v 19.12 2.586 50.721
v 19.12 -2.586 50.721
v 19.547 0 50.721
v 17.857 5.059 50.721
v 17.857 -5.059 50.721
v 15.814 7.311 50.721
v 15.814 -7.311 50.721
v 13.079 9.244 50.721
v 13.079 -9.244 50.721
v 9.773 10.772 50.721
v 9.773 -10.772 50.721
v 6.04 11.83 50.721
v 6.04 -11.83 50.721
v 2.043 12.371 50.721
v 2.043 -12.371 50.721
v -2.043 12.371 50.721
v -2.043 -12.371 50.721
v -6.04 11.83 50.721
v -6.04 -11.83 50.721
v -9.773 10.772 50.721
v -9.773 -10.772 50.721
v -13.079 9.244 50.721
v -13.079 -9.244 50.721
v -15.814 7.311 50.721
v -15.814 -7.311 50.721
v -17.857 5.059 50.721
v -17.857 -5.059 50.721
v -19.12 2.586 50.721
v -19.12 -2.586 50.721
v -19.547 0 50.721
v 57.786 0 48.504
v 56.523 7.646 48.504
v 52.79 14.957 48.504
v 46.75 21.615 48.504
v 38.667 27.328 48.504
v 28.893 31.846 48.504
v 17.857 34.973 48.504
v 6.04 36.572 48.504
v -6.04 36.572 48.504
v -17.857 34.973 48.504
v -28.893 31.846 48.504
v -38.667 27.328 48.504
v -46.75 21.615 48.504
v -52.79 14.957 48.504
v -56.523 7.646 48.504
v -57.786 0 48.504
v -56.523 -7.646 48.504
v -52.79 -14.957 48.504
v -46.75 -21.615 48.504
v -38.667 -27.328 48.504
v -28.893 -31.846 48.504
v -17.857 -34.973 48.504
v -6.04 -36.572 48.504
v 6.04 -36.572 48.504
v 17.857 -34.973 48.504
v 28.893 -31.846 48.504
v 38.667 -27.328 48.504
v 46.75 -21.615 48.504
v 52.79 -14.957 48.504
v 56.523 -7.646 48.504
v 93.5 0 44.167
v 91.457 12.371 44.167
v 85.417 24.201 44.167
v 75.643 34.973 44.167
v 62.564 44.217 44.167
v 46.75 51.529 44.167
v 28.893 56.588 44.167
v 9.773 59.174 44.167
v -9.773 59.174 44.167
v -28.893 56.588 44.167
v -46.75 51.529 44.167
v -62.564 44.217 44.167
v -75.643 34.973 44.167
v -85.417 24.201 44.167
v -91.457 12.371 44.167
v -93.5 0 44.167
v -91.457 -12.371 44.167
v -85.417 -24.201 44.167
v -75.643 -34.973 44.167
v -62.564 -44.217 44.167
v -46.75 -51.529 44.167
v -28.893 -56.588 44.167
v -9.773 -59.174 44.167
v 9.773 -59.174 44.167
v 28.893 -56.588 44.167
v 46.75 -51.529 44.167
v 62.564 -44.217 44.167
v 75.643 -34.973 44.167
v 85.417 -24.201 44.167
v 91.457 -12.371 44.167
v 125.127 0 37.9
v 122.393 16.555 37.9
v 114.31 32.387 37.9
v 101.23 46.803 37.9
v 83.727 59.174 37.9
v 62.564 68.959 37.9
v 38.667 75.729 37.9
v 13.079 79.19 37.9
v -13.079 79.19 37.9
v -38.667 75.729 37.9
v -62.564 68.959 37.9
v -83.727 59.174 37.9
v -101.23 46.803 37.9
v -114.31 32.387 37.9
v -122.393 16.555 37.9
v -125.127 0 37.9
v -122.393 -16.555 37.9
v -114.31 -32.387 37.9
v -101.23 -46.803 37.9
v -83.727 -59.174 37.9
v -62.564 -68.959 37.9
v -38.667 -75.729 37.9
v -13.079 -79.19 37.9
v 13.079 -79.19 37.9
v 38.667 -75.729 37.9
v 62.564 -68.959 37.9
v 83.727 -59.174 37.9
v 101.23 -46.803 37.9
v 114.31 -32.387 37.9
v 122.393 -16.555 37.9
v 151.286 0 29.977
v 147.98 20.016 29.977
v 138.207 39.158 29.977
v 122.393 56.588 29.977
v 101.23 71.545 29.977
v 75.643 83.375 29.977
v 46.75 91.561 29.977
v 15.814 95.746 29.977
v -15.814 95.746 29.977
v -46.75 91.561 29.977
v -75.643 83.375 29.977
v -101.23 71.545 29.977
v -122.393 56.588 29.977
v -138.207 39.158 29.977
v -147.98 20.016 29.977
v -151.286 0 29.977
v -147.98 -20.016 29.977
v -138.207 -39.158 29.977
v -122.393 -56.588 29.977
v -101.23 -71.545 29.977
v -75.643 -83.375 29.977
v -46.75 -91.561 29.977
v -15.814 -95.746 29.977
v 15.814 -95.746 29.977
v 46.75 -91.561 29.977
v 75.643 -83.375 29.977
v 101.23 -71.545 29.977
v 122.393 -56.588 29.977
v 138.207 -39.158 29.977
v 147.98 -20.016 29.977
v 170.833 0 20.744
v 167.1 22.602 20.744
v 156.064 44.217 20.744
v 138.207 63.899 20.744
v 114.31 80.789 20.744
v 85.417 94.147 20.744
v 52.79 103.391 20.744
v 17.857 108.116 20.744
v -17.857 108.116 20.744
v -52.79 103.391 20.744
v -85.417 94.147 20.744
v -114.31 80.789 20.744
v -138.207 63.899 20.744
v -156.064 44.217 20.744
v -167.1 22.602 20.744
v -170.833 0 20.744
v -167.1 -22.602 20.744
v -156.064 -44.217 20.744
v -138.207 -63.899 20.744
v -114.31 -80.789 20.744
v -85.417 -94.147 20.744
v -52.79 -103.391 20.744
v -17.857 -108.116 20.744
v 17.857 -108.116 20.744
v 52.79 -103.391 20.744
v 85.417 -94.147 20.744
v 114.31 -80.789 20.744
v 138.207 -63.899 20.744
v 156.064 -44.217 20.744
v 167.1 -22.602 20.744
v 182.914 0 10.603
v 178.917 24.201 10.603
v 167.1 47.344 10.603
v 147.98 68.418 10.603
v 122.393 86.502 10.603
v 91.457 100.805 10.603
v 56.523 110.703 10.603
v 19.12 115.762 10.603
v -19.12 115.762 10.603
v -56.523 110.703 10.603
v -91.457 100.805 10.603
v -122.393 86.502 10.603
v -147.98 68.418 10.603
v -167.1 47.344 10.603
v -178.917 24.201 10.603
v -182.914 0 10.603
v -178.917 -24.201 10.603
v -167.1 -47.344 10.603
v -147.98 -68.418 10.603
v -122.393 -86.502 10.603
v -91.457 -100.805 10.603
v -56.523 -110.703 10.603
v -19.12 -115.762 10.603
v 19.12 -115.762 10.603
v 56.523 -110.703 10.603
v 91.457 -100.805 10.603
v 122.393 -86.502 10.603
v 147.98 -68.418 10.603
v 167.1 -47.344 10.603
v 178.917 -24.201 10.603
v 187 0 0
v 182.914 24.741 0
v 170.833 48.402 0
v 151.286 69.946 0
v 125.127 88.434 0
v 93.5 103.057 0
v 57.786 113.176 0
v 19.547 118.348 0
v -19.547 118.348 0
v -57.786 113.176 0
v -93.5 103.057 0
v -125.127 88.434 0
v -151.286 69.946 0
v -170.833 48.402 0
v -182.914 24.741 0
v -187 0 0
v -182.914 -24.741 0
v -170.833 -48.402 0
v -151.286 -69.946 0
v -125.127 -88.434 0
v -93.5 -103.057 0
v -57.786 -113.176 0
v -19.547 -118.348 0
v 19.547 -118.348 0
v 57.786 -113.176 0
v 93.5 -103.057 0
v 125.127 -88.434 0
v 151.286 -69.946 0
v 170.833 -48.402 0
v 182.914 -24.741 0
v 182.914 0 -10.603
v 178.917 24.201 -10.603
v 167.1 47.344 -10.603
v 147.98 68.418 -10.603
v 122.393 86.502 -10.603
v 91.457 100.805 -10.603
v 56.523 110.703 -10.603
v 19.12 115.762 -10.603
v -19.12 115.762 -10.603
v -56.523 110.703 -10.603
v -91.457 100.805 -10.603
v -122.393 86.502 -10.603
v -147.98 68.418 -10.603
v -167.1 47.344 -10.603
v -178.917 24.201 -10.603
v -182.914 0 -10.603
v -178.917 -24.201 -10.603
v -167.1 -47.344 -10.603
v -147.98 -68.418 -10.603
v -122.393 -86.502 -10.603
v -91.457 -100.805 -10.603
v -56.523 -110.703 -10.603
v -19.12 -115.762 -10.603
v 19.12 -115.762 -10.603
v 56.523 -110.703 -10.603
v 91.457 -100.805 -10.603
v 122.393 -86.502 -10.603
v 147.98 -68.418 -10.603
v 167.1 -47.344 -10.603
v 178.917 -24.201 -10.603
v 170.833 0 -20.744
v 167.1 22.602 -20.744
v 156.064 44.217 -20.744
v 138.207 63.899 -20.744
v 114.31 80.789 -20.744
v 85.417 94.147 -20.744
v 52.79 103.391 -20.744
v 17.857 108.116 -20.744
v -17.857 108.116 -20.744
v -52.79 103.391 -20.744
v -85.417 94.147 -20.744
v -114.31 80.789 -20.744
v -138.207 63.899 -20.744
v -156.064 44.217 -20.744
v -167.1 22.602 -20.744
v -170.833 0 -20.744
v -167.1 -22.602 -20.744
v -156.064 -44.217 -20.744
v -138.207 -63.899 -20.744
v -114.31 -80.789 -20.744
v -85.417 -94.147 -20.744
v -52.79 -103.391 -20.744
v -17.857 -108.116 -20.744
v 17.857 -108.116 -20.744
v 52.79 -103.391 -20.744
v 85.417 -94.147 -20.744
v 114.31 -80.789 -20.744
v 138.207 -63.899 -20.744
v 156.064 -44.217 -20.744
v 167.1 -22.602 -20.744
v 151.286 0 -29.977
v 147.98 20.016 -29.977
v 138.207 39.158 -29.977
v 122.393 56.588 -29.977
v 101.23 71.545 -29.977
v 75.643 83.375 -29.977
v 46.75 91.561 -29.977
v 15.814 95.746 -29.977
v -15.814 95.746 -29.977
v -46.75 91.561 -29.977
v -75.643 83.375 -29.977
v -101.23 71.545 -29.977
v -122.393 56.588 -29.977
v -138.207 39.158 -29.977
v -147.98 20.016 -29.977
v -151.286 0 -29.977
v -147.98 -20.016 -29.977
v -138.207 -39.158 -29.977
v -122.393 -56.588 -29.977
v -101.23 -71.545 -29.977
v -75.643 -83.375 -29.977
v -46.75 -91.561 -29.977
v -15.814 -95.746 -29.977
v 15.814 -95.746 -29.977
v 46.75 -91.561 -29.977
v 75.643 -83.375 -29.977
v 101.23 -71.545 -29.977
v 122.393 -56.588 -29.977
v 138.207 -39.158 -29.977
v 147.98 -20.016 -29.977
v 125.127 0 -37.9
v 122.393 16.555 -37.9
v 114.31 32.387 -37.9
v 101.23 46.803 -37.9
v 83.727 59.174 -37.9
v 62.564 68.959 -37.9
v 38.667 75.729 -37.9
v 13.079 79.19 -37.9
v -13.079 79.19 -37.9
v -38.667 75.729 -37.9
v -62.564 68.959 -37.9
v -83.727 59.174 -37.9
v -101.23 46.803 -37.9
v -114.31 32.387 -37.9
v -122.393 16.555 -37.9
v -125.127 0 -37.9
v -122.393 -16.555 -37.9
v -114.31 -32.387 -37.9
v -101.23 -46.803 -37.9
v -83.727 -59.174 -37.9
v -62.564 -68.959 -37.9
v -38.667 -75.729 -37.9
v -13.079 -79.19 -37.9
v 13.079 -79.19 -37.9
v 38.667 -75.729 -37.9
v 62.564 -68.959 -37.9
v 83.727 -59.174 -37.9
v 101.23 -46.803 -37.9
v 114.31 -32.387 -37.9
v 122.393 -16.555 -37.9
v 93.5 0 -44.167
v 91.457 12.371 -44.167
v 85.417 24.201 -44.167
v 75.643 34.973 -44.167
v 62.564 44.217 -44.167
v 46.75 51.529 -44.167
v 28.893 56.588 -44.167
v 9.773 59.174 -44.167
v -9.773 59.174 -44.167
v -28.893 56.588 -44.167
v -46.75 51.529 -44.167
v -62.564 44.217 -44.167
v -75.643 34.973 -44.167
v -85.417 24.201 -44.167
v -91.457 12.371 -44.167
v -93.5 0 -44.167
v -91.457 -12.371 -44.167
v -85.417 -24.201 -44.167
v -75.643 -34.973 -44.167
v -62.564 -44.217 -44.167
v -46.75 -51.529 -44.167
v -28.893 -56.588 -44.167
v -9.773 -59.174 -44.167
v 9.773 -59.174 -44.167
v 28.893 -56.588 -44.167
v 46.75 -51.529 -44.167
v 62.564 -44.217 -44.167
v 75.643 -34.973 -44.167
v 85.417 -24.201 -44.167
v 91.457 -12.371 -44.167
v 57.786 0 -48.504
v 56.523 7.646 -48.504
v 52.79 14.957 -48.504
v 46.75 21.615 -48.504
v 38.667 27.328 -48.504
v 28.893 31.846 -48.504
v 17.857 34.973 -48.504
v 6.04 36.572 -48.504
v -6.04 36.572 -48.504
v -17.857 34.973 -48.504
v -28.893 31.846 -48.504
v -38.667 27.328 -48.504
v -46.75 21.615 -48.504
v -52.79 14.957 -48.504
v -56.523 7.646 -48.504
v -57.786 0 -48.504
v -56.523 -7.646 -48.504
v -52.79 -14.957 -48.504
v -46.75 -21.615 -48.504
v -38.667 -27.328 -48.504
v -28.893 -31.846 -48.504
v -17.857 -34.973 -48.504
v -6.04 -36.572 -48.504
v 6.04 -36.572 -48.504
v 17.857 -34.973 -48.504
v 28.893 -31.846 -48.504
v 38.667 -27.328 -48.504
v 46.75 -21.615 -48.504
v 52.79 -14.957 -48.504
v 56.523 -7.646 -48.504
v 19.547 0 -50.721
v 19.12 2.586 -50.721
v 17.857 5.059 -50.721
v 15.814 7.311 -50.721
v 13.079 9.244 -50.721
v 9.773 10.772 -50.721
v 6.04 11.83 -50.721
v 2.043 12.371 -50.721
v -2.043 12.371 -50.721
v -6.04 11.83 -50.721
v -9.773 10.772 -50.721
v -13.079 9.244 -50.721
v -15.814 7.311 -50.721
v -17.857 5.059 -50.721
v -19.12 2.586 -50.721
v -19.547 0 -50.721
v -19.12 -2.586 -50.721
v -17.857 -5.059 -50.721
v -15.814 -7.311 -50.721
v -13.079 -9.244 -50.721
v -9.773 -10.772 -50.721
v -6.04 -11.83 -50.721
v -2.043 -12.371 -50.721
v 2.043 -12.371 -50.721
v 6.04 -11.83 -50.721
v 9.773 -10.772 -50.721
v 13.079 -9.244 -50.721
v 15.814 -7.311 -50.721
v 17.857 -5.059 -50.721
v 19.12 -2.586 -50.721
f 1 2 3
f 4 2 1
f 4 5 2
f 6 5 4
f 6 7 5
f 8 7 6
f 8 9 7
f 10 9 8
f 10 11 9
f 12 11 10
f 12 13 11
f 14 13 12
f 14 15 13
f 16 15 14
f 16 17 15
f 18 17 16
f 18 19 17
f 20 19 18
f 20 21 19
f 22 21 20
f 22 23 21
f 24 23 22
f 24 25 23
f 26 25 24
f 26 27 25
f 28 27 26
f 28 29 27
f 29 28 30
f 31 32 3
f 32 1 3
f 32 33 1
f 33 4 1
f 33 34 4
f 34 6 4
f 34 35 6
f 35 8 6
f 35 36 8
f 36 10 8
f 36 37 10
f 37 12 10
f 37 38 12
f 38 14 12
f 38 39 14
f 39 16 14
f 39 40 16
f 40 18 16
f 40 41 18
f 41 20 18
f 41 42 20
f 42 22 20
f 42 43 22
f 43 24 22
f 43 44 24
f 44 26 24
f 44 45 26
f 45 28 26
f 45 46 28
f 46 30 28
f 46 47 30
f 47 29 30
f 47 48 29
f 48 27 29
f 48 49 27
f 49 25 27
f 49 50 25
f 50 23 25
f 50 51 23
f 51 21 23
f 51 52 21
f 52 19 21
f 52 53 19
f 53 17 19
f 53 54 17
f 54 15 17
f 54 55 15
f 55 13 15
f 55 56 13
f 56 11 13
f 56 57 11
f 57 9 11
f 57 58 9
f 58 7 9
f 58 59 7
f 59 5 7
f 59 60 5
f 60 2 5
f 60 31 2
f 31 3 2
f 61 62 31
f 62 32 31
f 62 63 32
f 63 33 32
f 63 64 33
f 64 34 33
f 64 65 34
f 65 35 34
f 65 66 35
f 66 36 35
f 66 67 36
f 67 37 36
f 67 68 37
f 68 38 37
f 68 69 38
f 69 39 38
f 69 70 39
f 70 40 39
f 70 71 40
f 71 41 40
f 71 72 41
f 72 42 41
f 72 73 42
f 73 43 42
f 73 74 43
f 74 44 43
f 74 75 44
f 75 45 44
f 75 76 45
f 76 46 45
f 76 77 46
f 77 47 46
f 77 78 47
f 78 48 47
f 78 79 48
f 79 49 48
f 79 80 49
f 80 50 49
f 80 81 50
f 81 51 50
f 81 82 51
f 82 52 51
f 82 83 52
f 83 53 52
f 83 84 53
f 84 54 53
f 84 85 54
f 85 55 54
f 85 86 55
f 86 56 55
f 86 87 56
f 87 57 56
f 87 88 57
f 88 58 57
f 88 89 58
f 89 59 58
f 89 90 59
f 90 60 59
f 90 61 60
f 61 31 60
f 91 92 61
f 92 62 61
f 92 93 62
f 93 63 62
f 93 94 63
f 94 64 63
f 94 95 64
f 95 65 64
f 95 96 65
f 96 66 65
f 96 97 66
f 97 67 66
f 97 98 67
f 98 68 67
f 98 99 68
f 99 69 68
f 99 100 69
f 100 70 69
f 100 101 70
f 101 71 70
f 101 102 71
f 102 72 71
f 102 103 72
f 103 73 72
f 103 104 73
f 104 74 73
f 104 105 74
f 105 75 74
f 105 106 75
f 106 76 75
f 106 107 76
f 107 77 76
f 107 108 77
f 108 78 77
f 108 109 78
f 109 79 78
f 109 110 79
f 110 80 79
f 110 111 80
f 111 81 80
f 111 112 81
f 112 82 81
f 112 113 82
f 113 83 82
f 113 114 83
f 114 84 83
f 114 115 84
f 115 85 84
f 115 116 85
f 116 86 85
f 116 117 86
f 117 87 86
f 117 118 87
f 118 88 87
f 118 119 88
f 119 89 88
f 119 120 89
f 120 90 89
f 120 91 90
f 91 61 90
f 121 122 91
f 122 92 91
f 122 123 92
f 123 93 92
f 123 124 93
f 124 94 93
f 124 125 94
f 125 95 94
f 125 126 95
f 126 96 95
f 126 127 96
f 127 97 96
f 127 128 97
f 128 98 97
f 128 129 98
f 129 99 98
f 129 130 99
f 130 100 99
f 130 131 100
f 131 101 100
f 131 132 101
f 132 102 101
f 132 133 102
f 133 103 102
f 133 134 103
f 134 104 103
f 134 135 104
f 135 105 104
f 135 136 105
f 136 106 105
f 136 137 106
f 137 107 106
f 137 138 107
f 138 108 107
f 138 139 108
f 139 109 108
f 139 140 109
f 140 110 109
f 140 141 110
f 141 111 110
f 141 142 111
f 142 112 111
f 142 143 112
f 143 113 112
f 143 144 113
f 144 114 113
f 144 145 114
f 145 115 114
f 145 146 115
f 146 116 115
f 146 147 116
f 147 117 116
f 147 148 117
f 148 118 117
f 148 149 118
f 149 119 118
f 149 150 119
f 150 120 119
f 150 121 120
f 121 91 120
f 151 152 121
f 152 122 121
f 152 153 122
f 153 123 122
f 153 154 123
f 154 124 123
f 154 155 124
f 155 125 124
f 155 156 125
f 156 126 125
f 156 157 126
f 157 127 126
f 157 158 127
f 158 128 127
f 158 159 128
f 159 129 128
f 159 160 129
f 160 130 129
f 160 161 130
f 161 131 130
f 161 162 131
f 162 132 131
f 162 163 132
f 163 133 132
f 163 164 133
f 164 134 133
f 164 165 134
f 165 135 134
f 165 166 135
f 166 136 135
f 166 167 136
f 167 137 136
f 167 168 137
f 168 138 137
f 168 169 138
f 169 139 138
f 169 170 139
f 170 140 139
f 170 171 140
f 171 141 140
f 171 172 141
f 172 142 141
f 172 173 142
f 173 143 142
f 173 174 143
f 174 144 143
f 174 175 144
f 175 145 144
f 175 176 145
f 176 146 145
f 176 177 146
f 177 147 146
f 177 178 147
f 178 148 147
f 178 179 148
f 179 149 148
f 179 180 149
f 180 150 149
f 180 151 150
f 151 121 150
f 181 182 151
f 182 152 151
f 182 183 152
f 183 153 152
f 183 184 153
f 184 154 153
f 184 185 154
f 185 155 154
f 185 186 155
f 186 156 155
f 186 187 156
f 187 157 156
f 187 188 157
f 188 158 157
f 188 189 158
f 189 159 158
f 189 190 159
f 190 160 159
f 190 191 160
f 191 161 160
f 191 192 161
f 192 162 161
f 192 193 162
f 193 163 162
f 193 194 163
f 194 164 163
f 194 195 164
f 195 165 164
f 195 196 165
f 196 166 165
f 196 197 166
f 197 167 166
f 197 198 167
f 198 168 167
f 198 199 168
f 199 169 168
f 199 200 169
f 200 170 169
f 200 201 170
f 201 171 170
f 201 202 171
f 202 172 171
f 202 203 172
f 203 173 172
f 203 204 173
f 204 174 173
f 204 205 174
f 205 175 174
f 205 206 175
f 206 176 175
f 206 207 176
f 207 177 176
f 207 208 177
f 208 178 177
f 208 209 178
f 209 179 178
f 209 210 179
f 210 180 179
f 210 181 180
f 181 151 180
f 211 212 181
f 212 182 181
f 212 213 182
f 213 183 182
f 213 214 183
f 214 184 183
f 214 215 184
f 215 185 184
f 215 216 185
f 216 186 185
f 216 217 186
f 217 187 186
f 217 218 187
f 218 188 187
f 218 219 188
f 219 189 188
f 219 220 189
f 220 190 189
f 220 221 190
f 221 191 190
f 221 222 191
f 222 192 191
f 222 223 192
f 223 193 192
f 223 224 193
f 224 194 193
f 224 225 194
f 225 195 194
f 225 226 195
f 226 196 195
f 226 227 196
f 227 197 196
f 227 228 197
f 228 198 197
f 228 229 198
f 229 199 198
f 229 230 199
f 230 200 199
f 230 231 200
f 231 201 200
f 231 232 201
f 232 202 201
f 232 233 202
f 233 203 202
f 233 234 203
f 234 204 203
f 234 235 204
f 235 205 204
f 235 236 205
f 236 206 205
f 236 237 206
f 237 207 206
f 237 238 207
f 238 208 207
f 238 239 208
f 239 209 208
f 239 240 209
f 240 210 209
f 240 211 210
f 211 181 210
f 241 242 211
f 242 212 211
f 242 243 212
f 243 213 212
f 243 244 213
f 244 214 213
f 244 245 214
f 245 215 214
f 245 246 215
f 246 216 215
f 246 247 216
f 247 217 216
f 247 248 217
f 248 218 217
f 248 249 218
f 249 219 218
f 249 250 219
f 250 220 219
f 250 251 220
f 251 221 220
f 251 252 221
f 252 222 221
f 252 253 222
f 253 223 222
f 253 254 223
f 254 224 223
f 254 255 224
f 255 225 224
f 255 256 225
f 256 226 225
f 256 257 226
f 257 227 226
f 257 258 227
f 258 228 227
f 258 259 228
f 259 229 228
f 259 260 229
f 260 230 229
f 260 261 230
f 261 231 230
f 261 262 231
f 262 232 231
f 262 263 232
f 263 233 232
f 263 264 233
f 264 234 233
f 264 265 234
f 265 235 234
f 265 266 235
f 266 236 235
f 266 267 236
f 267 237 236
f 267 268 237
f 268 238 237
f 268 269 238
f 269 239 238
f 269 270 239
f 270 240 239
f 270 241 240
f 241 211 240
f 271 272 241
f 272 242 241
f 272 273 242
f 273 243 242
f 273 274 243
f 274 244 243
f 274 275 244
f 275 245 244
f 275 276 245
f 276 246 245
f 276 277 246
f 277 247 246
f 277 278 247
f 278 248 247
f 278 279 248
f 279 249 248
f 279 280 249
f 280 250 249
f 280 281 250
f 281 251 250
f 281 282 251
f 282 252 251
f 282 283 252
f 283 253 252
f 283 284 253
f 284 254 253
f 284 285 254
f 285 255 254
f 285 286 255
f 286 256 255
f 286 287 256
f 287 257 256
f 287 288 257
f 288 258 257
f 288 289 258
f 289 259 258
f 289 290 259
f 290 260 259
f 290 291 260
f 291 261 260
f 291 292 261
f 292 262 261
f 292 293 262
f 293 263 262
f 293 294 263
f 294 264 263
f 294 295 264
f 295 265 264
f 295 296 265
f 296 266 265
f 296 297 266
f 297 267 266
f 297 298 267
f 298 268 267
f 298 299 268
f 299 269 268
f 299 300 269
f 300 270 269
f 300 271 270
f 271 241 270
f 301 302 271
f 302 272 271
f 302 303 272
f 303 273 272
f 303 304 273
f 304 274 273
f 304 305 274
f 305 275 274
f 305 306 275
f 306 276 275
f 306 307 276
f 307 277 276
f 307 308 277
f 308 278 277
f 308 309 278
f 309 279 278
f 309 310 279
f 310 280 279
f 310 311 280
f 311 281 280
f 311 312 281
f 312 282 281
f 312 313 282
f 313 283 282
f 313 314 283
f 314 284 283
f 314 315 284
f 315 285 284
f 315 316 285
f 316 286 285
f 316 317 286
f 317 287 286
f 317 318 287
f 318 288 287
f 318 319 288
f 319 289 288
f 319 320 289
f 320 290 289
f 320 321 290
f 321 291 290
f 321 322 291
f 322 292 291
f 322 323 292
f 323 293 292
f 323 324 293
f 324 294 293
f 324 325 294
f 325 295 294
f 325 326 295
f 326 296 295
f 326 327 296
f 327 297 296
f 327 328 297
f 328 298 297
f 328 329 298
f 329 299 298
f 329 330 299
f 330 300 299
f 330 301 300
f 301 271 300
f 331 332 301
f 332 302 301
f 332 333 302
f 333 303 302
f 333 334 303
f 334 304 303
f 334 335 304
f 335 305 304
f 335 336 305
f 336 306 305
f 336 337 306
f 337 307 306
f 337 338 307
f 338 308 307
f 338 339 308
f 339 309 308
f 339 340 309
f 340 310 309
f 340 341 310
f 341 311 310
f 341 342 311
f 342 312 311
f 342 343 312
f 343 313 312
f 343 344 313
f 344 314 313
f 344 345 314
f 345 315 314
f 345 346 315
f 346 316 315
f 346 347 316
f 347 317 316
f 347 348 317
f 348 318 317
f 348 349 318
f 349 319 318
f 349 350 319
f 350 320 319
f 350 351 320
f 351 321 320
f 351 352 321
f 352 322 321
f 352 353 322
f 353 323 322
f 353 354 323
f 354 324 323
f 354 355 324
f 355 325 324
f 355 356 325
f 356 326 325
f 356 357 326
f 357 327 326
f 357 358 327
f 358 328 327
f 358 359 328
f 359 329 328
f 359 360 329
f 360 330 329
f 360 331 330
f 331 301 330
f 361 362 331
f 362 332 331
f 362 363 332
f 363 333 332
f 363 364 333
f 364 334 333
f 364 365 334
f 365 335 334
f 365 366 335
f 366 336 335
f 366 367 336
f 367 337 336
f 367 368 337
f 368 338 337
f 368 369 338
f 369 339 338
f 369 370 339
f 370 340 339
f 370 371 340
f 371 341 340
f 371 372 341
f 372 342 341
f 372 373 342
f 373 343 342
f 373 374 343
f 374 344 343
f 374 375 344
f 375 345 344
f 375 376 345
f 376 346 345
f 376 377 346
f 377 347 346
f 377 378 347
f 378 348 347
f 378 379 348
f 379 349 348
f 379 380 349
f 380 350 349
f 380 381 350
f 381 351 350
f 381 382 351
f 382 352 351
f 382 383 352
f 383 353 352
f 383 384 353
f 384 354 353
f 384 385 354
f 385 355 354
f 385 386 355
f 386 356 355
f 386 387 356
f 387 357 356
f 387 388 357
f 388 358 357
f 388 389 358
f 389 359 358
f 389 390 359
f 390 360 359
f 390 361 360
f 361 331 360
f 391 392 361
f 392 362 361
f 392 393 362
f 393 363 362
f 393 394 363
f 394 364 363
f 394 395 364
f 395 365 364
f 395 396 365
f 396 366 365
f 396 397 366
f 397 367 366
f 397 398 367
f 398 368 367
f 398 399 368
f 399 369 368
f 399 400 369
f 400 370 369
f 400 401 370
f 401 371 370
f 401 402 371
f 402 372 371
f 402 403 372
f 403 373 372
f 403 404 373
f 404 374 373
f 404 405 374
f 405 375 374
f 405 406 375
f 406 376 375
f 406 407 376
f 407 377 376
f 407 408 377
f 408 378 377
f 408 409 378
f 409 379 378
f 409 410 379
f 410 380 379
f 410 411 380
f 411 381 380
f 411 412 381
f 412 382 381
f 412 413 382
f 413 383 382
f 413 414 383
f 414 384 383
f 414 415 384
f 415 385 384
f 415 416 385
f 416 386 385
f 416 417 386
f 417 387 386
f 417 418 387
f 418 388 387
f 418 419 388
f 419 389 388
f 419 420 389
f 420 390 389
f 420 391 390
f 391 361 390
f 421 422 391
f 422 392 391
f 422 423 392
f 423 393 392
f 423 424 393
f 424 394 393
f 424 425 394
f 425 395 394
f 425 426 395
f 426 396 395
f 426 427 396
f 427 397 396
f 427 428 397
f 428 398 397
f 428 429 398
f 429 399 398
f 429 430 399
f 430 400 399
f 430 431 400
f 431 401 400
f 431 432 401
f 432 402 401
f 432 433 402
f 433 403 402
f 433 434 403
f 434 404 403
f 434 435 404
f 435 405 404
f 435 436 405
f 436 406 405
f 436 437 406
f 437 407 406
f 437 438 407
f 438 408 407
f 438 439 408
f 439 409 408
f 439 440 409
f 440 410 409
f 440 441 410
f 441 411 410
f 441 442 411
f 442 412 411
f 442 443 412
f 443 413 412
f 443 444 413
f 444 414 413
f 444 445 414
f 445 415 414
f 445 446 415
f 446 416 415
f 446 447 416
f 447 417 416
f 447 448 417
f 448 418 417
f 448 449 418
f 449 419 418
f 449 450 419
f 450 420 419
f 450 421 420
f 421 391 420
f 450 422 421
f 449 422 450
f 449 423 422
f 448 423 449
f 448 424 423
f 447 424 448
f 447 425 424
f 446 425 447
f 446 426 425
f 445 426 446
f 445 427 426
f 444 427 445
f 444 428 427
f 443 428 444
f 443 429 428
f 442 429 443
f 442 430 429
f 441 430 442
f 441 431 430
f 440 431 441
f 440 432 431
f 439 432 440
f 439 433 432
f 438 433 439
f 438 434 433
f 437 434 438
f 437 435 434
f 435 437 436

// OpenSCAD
// Generated by SolidPython 1.0.1 on 2020-07-29 00:46:49


scale(v = [11, 7, 3]) {
	sphere(r = 17);
}
/***********************************************
*********      SolidPython code:      **********
************************************************
 
# import packages: SolidPython
from solid import *
from solid.utils import *
from itertools import chain, combinations, permutations


class Resize:

    def __init__(self, scad_file):
        self.scad_file = scad_file
        #self.scad_file = import_scad(scad_file)
        # cone/cylinder param:
        self.r1 = 0
        self.r2 = 0
        self.h = 0
        # rectangular prism param:
        self.w = 0
        self.l = 0
        # ellipse param:
        self.r = 0

    # import OpenScad code (file name corresponds to shape)


    # classify shape + parameters
    def assign(self, param1, param2, param3):
        if self.scad_file == 'cone.scad':
            self.r1 = param1
            self.r2 = param2
            self.h = param3
        elif self.scad_file == 'cylinder.scad':
            self.r1 = param1
            self.r2 = param2
            self.h = param3
        elif self.scad_file == 'rectangularPrism.scad':
            self.h = param1
            self.l = param2
            self.w = param3
        else:
            self.r = param1
            self.h = param2

    # resize parameters
    def iterate(self):
        x = range(3, 20, 2)
        i = 1
        if self.scad_file == 'cone.scad':
            tempList = list(permutations(x, 2))
            for temp in tempList:
                param1 = temp[0]
                param2 = temp[1]
                filepath = 'produced_scad_files/' + 'cone' + str(param1) + '_' + str(param2) + '_' + '.scad'
                scad_render_to_file(cylinder(h=param1, r1=param2, r2=0), filepath)

        elif self.scad_file == 'cylinder.scad':
            tempList = list(permutations(x, 3))
            for temp in tempList:
                param1 = temp[0]
                param2 = temp[1]
                filepath = 'produced_scad_files/' + 'cylinder' + str(param1) + '_' + str(param2) + '_' + '.scad'
                scad_render_to_file(cylinder(h=param1, r1=param2, r2=param2), filepath)

        elif self.scad_file == 'rectangularPrism.scad':
            tempList = list(permutations(x, 3))
            for temp in tempList:
                param1 = temp[0]
                param2 = temp[1]
                param3 = temp[2]
                filepath = 'produced_scad_files/' + 'rectangularPrism' + str(param1) + '_' + str(param2) + '_' + str(
                    param3) + '.scad'
                scad_render_to_file(cube(size=(param1, param2, param3)), filepath)

        elif self.scad_file == 'ellipse.scad':
            tempList = list(permutations(x, 4))
            for temp in tempList:
                param1 = temp[0]
                param2 = temp[1]
                param3 = temp[2]
                param4 = temp[3]
                filepath = 'produced_scad_files/' + 'ellipse' + str(param1) + '_' + str(param2) + '_' + str(param3) + '_' + str(param4) + '.scad'
                scad_render_to_file(scale([param1, param2, param3])(sphere(r=param4)), filepath)

    def render_to_scadfile(self):
        scad_render_to_file(scad, 'example.scad') 
 
************************************************/
